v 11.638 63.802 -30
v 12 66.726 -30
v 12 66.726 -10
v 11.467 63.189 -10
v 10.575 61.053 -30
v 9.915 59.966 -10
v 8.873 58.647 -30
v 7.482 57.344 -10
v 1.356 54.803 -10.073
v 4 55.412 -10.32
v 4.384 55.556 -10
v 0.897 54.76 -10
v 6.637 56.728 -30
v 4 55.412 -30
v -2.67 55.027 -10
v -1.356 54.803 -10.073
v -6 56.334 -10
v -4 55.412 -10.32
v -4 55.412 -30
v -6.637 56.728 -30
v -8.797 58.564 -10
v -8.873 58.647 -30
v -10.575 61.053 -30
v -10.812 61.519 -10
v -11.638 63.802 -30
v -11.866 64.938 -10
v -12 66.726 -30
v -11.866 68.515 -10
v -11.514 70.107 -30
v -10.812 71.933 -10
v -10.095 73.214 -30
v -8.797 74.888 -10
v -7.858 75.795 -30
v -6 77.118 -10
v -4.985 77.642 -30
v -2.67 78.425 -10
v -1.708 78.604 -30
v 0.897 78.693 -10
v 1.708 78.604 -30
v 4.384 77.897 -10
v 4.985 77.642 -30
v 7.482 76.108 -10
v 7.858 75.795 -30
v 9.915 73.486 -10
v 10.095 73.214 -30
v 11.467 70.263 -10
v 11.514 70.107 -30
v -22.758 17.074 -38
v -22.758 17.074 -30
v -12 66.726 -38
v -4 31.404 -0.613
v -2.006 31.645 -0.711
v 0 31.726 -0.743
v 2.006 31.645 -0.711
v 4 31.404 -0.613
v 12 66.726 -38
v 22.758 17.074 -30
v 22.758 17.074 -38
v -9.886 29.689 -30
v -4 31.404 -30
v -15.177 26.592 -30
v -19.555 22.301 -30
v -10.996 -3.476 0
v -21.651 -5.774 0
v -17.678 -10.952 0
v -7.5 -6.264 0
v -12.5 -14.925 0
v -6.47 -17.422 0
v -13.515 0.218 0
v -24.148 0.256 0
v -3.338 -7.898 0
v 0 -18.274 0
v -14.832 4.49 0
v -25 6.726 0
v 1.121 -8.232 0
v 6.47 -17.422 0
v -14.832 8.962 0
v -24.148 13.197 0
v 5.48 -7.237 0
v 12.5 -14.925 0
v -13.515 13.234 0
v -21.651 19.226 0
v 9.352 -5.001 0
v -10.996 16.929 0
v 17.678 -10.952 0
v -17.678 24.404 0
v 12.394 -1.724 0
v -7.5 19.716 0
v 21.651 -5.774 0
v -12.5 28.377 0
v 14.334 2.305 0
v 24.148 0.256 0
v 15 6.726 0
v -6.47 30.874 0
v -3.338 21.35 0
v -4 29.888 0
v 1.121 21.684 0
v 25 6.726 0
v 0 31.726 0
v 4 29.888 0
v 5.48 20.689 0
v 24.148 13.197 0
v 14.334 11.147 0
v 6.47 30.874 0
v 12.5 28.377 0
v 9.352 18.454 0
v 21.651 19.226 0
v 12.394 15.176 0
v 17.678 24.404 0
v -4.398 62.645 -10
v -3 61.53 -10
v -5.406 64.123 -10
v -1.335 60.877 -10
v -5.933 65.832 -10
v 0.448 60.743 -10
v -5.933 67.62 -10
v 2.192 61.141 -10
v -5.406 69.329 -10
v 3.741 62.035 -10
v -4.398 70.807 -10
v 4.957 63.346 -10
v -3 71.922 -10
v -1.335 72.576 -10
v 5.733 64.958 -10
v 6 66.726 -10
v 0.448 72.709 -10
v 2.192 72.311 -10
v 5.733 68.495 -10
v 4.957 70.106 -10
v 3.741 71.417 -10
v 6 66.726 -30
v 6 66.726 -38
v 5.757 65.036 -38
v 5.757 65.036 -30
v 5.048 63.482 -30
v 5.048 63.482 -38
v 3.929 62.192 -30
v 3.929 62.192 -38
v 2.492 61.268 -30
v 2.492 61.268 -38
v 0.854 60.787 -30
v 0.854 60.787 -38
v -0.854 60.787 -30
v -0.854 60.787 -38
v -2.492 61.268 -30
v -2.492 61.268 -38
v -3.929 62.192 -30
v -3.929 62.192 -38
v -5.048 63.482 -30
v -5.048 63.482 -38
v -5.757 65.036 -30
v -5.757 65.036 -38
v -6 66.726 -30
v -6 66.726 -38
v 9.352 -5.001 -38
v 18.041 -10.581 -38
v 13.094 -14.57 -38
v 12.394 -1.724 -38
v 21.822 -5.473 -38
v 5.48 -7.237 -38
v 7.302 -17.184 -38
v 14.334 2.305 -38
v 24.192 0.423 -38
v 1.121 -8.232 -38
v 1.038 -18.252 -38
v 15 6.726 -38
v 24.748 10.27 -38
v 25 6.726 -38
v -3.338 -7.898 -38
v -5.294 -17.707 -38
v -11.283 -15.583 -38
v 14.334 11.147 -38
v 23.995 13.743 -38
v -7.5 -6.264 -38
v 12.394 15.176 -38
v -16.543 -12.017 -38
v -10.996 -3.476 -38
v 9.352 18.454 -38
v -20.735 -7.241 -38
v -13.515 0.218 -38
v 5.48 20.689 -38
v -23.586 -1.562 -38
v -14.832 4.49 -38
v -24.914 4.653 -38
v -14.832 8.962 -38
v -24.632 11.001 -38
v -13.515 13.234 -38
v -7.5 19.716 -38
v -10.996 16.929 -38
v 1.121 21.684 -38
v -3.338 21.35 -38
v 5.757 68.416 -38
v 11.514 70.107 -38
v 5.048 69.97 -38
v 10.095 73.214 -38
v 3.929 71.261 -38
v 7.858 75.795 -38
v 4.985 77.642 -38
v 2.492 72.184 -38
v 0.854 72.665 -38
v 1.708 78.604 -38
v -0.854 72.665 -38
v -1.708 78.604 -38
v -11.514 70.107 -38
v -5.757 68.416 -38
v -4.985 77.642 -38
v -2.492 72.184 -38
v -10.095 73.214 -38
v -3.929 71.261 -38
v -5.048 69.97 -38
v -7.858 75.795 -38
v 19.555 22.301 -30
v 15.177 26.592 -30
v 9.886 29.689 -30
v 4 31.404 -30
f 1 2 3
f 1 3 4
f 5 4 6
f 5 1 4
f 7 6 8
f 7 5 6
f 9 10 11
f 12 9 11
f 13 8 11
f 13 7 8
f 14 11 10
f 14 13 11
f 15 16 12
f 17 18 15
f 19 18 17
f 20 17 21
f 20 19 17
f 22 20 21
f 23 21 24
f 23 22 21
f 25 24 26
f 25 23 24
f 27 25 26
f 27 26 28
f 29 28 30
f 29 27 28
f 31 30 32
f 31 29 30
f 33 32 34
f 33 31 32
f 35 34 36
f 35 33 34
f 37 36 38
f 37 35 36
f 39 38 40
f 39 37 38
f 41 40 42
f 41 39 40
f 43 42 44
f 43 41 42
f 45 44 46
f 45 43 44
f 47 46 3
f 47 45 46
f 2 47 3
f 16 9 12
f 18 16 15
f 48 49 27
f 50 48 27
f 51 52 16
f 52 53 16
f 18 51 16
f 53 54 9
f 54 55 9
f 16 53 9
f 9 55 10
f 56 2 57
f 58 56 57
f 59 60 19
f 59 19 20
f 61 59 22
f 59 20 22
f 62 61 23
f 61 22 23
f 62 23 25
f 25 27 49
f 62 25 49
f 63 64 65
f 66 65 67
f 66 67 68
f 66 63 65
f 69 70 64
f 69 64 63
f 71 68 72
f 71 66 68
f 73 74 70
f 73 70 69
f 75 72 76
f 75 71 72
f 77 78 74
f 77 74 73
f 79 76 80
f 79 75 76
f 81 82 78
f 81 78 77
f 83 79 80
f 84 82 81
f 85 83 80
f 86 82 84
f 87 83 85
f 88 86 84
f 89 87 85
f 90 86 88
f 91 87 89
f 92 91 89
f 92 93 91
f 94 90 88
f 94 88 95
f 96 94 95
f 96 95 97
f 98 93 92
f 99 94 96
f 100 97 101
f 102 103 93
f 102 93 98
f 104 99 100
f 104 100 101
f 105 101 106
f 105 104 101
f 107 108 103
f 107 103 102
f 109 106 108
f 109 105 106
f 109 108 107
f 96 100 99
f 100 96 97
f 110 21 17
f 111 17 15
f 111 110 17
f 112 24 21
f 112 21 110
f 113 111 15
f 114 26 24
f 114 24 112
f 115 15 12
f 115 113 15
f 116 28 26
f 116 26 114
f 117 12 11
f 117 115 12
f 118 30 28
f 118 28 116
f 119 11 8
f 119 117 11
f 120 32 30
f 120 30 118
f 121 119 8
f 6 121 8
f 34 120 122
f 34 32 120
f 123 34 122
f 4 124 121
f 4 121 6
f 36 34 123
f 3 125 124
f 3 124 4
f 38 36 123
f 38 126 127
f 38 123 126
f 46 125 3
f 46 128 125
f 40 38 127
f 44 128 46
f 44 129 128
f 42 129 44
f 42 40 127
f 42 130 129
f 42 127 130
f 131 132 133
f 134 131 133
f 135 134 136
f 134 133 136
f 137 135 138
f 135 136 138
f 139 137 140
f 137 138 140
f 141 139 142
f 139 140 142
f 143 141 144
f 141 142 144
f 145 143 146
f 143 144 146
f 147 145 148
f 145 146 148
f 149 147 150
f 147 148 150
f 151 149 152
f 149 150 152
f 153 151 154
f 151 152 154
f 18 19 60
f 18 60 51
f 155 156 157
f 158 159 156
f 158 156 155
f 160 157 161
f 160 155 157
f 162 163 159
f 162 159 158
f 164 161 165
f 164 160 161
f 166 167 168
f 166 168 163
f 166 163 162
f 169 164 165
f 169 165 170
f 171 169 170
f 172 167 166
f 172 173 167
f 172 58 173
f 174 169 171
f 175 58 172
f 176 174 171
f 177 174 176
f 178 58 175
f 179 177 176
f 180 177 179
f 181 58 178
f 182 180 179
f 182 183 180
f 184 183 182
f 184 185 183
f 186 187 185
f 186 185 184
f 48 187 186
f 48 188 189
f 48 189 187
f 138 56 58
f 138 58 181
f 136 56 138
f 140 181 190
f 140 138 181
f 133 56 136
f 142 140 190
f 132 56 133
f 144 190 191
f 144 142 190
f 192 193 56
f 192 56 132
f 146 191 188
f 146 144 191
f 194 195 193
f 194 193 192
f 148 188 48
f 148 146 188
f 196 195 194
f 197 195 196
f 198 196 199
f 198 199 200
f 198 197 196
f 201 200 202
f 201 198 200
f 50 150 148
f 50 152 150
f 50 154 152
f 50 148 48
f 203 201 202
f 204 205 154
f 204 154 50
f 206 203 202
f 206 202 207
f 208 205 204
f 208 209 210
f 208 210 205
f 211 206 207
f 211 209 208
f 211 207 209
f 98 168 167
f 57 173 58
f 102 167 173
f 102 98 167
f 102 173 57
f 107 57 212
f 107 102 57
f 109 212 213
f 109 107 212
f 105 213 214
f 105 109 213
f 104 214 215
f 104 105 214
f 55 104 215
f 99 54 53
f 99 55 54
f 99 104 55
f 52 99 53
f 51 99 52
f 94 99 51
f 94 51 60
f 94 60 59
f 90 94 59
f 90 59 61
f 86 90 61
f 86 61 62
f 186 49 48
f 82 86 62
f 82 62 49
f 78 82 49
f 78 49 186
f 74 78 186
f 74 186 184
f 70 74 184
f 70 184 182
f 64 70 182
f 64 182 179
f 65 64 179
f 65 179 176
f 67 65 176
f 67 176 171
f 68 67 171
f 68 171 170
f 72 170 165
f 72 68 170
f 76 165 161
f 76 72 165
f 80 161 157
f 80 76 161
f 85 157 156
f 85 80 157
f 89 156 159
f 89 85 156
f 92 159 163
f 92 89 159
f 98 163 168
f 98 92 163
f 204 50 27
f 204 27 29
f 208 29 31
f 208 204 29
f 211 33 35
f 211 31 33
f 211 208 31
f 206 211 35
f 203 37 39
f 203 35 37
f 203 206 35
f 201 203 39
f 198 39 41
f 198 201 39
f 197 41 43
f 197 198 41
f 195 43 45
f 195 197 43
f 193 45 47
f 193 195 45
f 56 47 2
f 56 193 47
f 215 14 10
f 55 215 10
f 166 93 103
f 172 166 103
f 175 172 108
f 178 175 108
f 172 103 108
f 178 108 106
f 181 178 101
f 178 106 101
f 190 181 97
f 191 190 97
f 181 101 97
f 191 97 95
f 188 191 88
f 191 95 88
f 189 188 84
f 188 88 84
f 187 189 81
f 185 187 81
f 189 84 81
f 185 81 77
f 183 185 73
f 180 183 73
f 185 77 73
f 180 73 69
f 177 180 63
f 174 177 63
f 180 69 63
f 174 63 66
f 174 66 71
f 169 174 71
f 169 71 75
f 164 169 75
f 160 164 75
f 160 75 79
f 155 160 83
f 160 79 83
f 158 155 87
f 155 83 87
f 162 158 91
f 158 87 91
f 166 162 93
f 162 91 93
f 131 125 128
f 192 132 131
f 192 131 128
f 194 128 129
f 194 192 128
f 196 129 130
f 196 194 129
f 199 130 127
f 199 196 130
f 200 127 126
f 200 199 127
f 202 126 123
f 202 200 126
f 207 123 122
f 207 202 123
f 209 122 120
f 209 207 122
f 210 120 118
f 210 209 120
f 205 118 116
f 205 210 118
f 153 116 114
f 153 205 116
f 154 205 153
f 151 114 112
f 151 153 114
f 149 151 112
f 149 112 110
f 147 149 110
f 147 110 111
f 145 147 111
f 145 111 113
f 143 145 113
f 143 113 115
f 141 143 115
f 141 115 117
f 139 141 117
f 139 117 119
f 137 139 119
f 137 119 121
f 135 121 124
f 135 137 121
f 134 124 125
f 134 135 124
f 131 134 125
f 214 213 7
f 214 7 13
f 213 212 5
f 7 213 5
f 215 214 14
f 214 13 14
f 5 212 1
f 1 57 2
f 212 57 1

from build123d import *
from build123d.topology import SkipClean

# Parameters (mm, degrees)
SKETCH2_R           = 25
SKETCH2_R_2         = 15
BOSS_EXTRUDE1_DEPTH = 38
BOSS_EXTRUDE3_START = -8
BOSS_EXTRUDE3_DEPTH = 8
SKETCH4_R           = 12
SKETCH4_R_2         = 6
BOSS_EXTRUDE4_DEPTH = 20
BOSS_EXTRUDE5_START = 8
BOSS_EXTRUDE5_DEPTH = 8
CUT_EXTRUDE1_START  = -71
CUT_EXTRUDE1_DEPTH  = 71
BOSS_EXTRUDE8_DEPTH = 4


with BuildPart() as part:
    # Sketch2 → Boss-Extrude1 (new body)
    with BuildSketch(Plane.XY):
        with Locations((0, 6.726092211)):
            Circle(SKETCH2_R)
        with Locations((0, 6.726092211)):
            Circle(SKETCH2_R_2, mode=Mode.SUBTRACT)
    extrude(amount=-BOSS_EXTRUDE1_DEPTH)

    # Sketch5 → Boss-Extrude3 (add)
    with BuildSketch(Plane(origin=(0, 0, -38), x_dir=(-1, 0, 0), z_dir=(0, 0, -1)).offset(BOSS_EXTRUDE3_START)):
        with BuildLine():
            Line((-12, 66.726092211), (-22.758026002, 17.073664512))
            ThreePointArc((-22.758026002, 17.073664512), (0, 31.726092211), (22.758026002, 17.073664512))
            Line((22.758026002, 17.073664512), (12, 66.726092211))
            Line((12, 66.726092211), (-12, 66.726092211))
        make_face()
    extrude(amount=BOSS_EXTRUDE3_DEPTH)

    # Sketch4 → Boss-Extrude4 (add)
    with BuildSketch(Plane.XY.offset(-30)):
        with Locations((0, 66.726092211)):
            Circle(SKETCH4_R)
        with Locations((0, 66.726092211)):
            Circle(SKETCH4_R_2, mode=Mode.SUBTRACT)
    extrude(amount=BOSS_EXTRUDE4_DEPTH)

    # Sketch6 → Boss-Extrude5 (add)
    with BuildSketch(Plane(origin=(0, 0, -30), x_dir=(-1, 0, 0), z_dir=(0, 0, -1)).offset(BOSS_EXTRUDE5_START)):
        with BuildLine():
            Line((6, 66.726092211), (12, 66.726092211))
            ThreePointArc((12, 66.726092211), (0, 78.726092211), (-12, 66.726092211))
            Line((-12, 66.726092211), (-6, 66.726092211))
            ThreePointArc((-6, 66.726092211), (0, 72.726092211), (6, 66.726092211))
        make_face()
    extrude(amount=-BOSS_EXTRUDE5_DEPTH)

    # Sketch8 → Cut-Extrude1 (cut)
    with SkipClean():  # the faces are left unmerged after this step: merging them gives an invalid solid
        with BuildSketch(Plane.XY.offset(-30).offset(CUT_EXTRUDE1_START)):
            with BuildLine():
                Line((-6, 66.726092211), (6, 66.726092211))
                ThreePointArc((6, 66.726092211), (0, 60.726092211), (-6, 66.726092211))
            make_face()
        extrude(amount=CUT_EXTRUDE1_DEPTH, mode=Mode.SUBTRACT)

    # Sketch9 → Boss-Extrude8 (add, symmetric)
    with SkipClean():  # the faces are left unmerged after this step: merging them gives an invalid solid
        with BuildSketch(Plane(origin=(0, 0, 0), x_dir=(0, 0, -1), z_dir=(1, 0, 0))):
            Polygon((10.883614589, 56.807254431), (30, 56.807254431), (31.174578116, 56.807254431), (31.174578116, 29.887909486), (0, 29.887909486), align=None)
        extrude(amount=BOSS_EXTRUDE8_DEPTH, both=True)


solid = part.part
